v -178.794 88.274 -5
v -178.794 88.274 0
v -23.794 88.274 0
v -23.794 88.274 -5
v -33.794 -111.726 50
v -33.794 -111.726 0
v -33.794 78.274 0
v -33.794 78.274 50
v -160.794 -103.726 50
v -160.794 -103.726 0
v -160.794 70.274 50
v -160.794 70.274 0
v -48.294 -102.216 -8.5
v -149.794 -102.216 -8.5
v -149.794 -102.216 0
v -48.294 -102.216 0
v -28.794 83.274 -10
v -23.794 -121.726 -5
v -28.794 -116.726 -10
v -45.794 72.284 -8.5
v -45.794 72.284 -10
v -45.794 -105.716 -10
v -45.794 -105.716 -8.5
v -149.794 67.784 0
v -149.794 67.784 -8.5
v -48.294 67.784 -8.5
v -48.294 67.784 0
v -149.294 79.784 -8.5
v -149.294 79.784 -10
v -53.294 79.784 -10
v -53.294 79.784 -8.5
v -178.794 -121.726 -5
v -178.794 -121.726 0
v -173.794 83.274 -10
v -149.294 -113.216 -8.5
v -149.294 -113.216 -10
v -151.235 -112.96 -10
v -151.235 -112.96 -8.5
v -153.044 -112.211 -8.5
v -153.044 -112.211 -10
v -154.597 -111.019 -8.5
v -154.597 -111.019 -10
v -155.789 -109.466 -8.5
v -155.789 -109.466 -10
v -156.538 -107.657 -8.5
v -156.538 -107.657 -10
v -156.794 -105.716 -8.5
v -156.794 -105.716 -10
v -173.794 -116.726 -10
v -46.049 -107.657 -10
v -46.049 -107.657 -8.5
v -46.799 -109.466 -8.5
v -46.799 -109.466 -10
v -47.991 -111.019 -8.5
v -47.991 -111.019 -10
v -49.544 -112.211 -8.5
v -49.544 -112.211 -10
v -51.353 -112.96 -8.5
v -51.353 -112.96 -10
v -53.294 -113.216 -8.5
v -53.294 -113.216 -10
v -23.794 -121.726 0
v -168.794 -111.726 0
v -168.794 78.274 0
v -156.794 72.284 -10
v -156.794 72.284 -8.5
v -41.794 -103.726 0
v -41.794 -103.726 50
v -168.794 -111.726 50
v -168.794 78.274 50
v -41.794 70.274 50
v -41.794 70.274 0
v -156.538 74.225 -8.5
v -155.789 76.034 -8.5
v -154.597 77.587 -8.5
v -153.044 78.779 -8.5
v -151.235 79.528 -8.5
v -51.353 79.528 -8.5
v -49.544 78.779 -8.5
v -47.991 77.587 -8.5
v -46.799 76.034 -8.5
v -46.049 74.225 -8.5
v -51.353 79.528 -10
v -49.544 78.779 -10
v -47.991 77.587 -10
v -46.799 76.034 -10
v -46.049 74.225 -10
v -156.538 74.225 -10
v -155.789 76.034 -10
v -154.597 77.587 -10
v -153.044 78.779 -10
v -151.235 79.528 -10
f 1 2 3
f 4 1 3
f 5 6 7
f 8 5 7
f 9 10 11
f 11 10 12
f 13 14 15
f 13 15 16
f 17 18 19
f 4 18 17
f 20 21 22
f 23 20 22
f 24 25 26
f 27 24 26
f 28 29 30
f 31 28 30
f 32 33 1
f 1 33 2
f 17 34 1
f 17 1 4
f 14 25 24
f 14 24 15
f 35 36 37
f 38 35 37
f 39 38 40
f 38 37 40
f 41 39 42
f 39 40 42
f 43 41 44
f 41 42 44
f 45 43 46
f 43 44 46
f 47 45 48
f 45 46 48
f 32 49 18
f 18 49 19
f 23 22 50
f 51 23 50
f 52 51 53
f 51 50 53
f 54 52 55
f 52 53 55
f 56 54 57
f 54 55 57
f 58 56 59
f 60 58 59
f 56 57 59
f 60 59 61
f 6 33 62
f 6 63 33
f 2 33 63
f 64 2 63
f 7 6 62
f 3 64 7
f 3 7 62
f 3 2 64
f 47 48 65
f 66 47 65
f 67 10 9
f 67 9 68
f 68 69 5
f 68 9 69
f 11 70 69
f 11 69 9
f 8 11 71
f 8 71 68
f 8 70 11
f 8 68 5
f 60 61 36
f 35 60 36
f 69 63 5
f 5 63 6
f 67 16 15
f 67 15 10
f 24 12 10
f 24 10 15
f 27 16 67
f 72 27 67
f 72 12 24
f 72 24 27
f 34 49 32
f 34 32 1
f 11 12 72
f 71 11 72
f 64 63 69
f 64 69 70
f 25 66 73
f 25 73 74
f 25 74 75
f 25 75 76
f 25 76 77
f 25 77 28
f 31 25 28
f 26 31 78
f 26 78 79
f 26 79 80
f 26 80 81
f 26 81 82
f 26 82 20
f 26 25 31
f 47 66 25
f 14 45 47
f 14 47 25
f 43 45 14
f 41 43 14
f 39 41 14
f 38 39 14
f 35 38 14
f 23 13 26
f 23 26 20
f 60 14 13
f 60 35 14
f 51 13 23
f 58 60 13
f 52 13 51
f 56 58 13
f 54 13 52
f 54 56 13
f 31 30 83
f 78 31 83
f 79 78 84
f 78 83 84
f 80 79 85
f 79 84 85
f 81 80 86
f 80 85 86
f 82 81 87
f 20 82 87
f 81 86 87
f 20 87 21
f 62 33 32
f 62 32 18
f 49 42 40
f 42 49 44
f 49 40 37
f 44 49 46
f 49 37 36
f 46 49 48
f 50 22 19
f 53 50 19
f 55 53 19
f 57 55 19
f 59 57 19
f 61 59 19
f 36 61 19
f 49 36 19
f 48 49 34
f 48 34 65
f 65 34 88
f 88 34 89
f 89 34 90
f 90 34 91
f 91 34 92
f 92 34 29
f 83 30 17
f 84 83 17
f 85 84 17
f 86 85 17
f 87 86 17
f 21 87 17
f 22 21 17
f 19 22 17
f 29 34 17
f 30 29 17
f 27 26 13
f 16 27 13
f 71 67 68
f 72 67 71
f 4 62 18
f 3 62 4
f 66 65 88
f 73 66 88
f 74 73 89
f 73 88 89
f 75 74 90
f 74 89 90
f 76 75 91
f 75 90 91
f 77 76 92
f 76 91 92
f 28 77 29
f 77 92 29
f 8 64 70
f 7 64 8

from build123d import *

# Parameters (mm, degrees)
F0_W     = 135
F0_H     = 190
F0_W_2   = 119
F0_H_2   = 174
F1_DEPTH = 50
F0_W_3   = 155
F0_H_3   = 210
F2_DEPTH = 10
F3_SIZE  = 5
F5_DEPTH = 1.5
F6_W     = 101.5
F6_H     = 170
F7_DEPTH = 60.001


# Not quite as in the source:
# - a feature names something its author has since deleted; it is built from what else it names


with BuildPart() as f1:
    # F0 (on Top) → F1 (new body)
    with BuildSketch(Plane.XY):
        with Locations((-101.2938845903, -16.7257675529)):
            Rectangle(F0_W, F0_H)
        with Locations((-101.2938845903, -16.7257675529)):
            Rectangle(F0_W_2, F0_H_2, mode=Mode.SUBTRACT)
    extrude(amount=F1_DEPTH)

    # F0 (on Top) → F2 (join)
    with BuildSketch(Plane.XY):
        with Locations((-101.2938845903, -16.7257675529)):
            Rectangle(F0_W_3, F0_H_3)
        with Locations((-101.2938845903, -16.7257675529)):
            Rectangle(F0_W, F0_H, mode=Mode.SUBTRACT)
        with Locations((-101.2938845903, -16.7257675529)):
            Rectangle(F0_W, F0_H)
        with Locations((-101.2938845903, -16.7257675529)):
            Rectangle(F0_W_2, F0_H_2, mode=Mode.SUBTRACT)
        with Locations((-101.2938845903, -16.7257675529)):
            Rectangle(F0_W_2, F0_H_2)
    extrude(amount=-F2_DEPTH)

    # F3
    f3_edges = [f1.edges().sort_by_distance(p)[0] for p in [
        (-101.293885, 88.274232, -10),
        (-178.793885, -16.725768, -10),
        (-101.293885, -121.725768, -10),
        (-23.793885, -16.725768, -10),
    ]]
    chamfer(f3_edges, length=F3_SIZE)

    # F4 (on face) → F5 (cut)
    with BuildSketch(Plane(origin=(0, 0, -10), x_dir=(1, 0, 0), z_dir=(0, 0, -1))):
        with BuildLine():
            Line((-53.2938845903, 113.2159726396), (-149.2938845903, 113.2159726396))
            ThreePointArc((-149.2938845903, 113.2159726396), (-154.5971854492, 111.0192734985), (-156.7938845903, 105.7159726396))
            Line((-156.7938845903, 105.7159726396), (-156.7938845903, -72.2840273604))
            ThreePointArc((-156.7938845903, -72.2840273604), (-154.5971854492, -77.5873282193), (-149.2938845903, -79.7840273604))
            Line((-149.2938845903, -79.7840273604), (-53.2938845903, -79.7840273604))
            ThreePointArc((-53.2938845903, -79.7840273604), (-47.9905837314, -77.5873282193), (-45.7938845903, -72.2840273604))
            Line((-45.7938845903, -72.2840273604), (-45.7938845903, 105.7159726396))
            ThreePointArc((-45.7938845903, 105.7159726396), (-47.9905837314, 111.0192734985), (-53.2938845903, 113.2159726396))
        make_face()
    extrude(amount=-F5_DEPTH, mode=Mode.SUBTRACT)

    # F6 (on face) → F7 (cut, through all)
    with BuildSketch(Plane(origin=(0, 0, -10), x_dir=(1, 0, 0), z_dir=(0, 0, -1))):
        with Locations((-99.0438845903, 17.2159726396)):
            Rectangle(F6_W, F6_H)
    extrude(amount=-F7_DEPTH, mode=Mode.SUBTRACT)


solid = f1.part
